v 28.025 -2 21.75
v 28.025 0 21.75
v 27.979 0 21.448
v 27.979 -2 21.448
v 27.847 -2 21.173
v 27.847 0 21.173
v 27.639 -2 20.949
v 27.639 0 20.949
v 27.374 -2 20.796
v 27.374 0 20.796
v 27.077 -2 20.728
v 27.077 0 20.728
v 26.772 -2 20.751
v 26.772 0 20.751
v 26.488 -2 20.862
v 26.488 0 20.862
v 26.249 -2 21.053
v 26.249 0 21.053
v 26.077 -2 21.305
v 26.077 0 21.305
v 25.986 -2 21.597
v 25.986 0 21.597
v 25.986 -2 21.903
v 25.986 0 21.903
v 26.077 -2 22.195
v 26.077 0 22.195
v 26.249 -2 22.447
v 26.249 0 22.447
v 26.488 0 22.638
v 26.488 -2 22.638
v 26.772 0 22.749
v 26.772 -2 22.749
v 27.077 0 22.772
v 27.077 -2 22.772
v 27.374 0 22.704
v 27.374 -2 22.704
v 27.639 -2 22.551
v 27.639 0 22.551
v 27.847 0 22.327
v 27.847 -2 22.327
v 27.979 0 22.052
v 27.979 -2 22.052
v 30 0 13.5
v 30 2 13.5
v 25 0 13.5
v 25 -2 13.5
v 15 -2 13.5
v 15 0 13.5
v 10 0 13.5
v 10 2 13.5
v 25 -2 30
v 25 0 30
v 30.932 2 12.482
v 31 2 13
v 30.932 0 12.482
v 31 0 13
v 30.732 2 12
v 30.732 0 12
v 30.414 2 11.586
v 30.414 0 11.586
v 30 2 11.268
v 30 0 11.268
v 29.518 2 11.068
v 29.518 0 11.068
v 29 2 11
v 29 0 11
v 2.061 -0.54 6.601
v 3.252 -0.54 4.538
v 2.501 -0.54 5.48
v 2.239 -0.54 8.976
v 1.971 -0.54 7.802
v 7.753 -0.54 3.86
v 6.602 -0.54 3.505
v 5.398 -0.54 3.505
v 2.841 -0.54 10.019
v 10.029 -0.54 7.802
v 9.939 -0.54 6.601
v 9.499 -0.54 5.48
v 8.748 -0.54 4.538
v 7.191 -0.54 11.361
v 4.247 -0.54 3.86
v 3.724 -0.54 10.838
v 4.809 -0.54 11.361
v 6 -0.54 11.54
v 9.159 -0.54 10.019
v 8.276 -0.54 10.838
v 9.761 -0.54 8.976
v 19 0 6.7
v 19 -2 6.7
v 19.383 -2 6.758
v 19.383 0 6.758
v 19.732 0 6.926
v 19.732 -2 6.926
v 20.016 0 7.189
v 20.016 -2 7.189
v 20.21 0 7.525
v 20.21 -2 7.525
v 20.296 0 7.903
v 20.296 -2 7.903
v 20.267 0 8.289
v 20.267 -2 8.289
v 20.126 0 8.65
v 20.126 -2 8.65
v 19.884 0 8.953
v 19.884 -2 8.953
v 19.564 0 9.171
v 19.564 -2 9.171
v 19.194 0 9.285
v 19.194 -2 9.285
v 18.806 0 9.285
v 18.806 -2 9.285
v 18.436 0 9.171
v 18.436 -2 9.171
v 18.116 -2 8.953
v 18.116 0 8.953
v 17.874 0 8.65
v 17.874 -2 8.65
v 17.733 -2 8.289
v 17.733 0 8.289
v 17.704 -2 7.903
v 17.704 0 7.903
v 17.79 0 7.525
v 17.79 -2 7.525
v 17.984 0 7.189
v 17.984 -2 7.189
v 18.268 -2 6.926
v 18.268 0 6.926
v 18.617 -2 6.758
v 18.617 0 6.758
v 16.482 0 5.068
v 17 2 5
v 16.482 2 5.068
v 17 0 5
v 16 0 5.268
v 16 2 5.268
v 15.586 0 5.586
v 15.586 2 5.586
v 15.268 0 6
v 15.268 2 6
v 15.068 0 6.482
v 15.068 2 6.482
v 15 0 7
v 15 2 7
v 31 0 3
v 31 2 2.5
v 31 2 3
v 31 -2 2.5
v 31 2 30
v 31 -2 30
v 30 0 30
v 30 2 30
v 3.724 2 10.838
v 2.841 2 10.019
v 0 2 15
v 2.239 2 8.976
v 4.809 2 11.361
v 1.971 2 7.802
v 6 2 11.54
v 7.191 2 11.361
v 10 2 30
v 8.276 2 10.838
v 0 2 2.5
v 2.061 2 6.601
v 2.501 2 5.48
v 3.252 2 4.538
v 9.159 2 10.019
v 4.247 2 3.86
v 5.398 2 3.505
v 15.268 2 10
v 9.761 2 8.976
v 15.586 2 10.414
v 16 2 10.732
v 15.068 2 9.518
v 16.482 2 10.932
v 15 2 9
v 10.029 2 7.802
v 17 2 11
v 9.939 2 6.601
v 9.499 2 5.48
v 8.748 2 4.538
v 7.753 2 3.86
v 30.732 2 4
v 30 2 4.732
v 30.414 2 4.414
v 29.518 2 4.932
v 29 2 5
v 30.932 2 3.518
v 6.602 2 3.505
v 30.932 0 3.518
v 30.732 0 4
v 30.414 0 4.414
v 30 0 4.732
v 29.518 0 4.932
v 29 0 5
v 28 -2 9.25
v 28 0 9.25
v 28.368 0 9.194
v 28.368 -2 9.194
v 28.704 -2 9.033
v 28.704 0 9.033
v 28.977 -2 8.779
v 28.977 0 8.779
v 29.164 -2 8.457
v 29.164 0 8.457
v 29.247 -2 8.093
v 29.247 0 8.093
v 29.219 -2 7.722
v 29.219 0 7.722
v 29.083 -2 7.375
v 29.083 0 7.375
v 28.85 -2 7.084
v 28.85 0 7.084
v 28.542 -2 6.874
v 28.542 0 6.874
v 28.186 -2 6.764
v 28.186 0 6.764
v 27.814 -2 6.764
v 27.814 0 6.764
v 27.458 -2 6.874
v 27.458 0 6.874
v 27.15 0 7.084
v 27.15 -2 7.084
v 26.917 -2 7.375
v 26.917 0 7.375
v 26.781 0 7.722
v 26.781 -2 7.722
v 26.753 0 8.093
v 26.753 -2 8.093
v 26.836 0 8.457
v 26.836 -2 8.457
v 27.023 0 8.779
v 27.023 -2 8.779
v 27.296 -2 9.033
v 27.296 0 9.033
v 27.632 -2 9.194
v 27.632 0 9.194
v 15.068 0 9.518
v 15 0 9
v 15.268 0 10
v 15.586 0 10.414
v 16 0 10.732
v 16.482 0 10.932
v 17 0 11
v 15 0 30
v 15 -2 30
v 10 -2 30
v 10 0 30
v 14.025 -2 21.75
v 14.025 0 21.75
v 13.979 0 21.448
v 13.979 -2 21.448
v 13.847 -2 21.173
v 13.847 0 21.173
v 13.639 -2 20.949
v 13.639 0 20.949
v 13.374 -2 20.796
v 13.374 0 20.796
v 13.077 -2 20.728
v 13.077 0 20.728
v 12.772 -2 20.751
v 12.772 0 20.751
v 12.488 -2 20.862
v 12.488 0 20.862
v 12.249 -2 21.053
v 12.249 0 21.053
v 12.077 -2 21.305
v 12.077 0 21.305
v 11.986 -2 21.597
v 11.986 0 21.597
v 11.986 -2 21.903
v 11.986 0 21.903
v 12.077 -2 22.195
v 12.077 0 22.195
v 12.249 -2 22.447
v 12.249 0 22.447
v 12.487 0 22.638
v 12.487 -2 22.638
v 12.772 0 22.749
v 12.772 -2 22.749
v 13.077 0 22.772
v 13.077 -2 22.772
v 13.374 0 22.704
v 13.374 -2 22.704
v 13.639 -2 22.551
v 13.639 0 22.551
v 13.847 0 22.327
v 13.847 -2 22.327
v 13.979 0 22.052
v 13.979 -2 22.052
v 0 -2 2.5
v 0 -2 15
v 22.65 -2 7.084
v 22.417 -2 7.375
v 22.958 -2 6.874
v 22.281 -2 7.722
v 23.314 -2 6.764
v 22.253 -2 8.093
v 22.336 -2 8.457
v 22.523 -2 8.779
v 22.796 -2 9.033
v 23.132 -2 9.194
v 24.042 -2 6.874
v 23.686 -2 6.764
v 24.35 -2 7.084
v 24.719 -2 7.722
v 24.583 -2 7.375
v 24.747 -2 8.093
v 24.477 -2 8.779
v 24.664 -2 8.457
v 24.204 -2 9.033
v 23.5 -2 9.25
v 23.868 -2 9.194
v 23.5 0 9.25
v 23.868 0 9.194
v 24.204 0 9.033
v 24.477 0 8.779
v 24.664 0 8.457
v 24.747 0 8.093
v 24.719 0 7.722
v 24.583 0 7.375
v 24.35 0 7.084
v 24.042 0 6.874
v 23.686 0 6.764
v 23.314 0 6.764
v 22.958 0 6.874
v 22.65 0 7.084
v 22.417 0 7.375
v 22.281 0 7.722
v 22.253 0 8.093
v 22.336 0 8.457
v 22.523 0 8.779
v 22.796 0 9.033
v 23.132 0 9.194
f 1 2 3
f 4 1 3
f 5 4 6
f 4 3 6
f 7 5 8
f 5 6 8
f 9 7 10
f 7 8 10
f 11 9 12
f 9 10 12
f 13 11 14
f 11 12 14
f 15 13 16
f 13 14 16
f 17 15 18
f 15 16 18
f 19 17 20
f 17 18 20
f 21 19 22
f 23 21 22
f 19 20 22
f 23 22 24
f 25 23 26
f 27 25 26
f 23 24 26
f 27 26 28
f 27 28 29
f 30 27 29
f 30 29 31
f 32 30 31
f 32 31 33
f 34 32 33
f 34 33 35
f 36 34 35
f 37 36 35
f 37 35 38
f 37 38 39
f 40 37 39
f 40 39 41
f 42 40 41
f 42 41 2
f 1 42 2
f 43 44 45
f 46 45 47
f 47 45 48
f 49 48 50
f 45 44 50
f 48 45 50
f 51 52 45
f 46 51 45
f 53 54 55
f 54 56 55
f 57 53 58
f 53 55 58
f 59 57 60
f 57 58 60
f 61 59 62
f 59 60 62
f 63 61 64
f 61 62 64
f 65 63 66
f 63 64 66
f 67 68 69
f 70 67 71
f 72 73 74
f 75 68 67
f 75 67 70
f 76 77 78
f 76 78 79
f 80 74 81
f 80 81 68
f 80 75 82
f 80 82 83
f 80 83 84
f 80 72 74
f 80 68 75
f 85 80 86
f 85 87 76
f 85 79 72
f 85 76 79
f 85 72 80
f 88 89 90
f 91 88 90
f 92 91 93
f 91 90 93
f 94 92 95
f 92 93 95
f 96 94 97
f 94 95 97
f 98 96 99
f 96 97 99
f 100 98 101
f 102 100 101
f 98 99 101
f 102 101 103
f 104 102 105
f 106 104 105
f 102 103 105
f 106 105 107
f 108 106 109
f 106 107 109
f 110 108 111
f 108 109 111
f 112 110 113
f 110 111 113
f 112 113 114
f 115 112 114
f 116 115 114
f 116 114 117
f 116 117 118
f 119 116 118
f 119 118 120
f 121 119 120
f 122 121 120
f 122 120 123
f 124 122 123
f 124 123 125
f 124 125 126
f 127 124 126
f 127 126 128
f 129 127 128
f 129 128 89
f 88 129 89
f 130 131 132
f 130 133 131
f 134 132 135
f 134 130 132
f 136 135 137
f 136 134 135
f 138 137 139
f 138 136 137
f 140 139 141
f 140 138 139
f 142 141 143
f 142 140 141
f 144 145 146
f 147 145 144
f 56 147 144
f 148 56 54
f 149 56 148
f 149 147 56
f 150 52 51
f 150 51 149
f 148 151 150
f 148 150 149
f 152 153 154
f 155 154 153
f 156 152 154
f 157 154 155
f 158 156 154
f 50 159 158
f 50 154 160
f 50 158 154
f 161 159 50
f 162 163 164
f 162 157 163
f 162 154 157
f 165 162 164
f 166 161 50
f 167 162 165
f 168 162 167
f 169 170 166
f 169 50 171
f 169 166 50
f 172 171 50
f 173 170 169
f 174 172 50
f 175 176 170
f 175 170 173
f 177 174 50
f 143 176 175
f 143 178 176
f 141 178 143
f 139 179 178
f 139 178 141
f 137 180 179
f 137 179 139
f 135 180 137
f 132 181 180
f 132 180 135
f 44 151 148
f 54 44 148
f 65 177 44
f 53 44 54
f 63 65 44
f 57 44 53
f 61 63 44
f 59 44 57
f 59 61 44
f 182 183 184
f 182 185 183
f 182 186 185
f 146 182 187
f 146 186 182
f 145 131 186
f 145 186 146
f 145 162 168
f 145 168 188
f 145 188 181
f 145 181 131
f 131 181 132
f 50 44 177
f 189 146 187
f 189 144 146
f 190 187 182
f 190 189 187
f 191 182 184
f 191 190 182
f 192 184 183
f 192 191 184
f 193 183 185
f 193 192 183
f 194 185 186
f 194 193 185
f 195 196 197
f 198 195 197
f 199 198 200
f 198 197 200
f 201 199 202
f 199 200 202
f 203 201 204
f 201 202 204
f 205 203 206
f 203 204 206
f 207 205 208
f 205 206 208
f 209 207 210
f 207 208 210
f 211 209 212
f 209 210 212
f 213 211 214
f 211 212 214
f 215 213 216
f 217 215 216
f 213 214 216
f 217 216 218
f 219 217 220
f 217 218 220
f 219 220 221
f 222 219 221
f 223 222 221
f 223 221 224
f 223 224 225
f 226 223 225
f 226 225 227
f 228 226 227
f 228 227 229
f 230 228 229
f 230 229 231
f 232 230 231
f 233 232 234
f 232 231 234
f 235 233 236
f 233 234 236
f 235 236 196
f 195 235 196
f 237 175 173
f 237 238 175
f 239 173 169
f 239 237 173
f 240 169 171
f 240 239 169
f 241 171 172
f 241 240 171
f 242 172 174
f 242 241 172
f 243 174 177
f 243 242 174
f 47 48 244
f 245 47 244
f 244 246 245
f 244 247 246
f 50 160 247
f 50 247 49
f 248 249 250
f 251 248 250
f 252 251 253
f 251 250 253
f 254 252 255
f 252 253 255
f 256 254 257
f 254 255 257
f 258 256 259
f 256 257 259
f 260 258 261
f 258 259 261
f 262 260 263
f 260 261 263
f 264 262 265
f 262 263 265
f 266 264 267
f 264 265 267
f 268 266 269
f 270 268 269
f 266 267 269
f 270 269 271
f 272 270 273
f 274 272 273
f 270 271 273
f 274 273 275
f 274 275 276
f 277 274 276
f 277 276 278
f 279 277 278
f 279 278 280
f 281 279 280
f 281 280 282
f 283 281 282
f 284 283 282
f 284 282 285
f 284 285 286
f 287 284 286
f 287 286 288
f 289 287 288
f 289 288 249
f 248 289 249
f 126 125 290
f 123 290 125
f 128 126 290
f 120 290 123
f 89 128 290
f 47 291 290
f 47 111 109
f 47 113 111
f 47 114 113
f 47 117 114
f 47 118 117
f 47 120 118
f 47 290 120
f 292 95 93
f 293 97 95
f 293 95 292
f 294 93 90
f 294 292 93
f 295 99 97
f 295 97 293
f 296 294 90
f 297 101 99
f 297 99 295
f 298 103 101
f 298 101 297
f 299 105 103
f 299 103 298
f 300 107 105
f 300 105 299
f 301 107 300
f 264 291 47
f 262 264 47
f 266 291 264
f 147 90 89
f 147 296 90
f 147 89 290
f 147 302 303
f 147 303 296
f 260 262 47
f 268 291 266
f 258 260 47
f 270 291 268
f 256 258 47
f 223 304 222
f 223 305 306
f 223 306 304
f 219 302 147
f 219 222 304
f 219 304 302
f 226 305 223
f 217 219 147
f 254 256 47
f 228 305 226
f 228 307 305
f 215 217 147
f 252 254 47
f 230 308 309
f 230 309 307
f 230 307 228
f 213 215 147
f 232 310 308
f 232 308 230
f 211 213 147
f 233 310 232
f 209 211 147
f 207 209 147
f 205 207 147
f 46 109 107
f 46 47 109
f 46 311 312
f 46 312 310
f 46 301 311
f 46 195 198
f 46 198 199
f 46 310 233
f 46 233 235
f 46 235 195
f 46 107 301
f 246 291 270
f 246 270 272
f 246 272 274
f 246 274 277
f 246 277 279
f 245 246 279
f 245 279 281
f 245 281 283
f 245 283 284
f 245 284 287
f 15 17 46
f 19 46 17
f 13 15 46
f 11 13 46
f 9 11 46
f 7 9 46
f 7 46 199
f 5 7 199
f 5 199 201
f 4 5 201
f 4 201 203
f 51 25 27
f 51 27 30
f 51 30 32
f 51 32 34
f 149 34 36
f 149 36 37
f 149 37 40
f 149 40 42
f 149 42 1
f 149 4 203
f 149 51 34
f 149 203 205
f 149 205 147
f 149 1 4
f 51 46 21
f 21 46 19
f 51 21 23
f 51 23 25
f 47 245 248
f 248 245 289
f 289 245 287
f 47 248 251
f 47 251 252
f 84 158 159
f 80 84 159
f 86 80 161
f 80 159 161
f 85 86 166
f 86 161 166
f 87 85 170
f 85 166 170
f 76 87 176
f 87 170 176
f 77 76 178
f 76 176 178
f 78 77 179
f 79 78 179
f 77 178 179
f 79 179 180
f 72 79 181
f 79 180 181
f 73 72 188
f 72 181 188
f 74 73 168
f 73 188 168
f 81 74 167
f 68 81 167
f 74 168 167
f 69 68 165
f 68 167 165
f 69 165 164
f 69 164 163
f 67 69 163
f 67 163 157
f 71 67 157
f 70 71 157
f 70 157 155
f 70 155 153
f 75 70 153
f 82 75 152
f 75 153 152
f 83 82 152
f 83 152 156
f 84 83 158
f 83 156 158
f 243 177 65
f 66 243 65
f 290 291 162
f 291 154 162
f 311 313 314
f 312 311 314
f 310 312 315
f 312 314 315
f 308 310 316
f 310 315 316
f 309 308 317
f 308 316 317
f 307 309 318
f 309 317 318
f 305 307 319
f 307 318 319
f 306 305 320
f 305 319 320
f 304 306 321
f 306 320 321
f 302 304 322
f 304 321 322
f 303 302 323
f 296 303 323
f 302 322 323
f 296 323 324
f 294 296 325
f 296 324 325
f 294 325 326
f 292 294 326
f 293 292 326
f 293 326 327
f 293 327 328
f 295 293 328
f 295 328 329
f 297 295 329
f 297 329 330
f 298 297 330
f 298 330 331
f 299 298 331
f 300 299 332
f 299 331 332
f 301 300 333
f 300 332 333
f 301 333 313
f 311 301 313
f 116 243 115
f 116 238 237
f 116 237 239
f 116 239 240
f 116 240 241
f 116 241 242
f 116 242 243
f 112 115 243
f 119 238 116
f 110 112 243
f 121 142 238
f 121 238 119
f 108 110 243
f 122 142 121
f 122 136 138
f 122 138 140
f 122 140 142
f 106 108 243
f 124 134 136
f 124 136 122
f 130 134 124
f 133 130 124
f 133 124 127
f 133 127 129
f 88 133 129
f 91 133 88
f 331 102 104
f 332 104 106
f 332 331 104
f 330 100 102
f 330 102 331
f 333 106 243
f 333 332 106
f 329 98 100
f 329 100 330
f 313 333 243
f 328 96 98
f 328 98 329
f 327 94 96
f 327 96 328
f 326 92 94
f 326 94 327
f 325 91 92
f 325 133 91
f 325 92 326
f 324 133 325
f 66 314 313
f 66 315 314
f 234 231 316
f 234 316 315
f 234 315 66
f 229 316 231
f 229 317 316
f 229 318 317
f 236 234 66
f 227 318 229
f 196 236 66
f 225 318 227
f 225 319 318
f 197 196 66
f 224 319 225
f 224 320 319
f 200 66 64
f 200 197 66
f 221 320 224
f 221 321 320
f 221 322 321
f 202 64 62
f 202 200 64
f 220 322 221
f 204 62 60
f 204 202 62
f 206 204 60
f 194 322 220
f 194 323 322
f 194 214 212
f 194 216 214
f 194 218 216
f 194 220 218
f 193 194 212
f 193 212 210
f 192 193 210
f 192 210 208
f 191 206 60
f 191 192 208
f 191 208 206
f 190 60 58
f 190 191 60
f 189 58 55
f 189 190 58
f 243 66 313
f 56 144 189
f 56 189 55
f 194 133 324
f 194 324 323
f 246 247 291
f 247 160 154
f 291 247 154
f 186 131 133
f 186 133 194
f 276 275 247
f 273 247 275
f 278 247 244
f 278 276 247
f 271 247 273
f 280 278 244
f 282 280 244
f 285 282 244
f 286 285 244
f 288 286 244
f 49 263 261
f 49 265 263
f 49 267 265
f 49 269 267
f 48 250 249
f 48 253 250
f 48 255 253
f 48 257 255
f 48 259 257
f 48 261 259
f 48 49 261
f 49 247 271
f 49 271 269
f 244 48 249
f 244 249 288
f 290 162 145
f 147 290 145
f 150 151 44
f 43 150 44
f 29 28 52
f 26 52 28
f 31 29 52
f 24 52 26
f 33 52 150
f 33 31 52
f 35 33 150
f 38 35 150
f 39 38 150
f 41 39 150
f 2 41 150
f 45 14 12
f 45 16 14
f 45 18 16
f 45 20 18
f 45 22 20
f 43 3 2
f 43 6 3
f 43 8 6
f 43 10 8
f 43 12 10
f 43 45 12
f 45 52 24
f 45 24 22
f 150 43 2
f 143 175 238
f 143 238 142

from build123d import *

# Parameters (mm, degrees)
EXTRUDE_1_DEPTH          = 2
EXTRUDE_2_DEPTH          = 3
SKETCH_3_W               = 16
SKETCH_3_H               = 60
EXTRUDE_3_DEPTH          = 3
CUT_EXTRUDE_1_DEPTH      = 1
CUT_EXTRUDE_2_DEPTH      = 69.543781629
SKETCH_6_W               = 20
SKETCH_6_H               = 16.5
CUT_EXTRUDE_4_DEPTH      = 2
CUT_EXTRUDE_6_DEPTH      = 69.543781629
CUT_EXTRUDE_6_DEPTH_BACK = 69.543781629
EXTRUDE_START            = -1
EXTRUDE_4_DEPTH          = 1
SKETCH_12_R              = 1
SKETCH_12_R_2            = 4
CUT_EXTRUDE_7_DEPTH      = 2.54
SKETCH_13_R              = 1.25
CUT_EXTRUDE_8_DEPTH      = 10
SKETCH_15_R              = 1
CUT_EXTRUDE_10_DEPTH     = 10
SKETCH_16_R              = 1.02
CUT_EXTRUDE_11_DEPTH     = 2
SKETCH_19_R              = 1.808389453
SKETCH_19_R_2            = 1.798107518
SKETCH_19_R_3            = 1.231148897
SKETCH_19_R_4            = 1.358627773
EXTRUDE_5_DEPTH          = 2
EXTRUDE_START_2          = -3
SKETCH_19_3_R            = 1.231148897
SKETCH_19_3_R_2          = 1.358627773
EXTRUDE_6_DEPTH          = 1
HOLE_WIZARD_M2_5_1_D     = 2.05
HOLE_WIZARD_M2_1_D       = 1.6
SKETCH_25_R              = 4.02
CUT_EXTRUDE_12_DEPTH     = 2.54
SKETCH_30_W              = 55.306598362
SKETCH_30_H              = 0.5
CUT_EXTRUDE_17_DEPTH     = 75.310646225
SKETCH_31_W              = 47.74998635
SKETCH_31_H              = 36.890870636
CUT_EXTRUDE_18_DEPTH     = 75.22986018
SKETCH_32_W              = 16
SKETCH_32_H              = 6
CUT_EXTRUDE_19_DEPTH     = 2
FILLET_2_R               = 2
SKETCH_33_R              = 1.25
CUT_EXTRUDE_20_DEPTH     = 2
SKETCH_35_R              = 4.02
EXTRUDE_7_DEPTH          = 4
SKETCH_36_R              = 4.04
CUT_EXTRUDE_21_DEPTH     = 2.54
SKETCH_37_W              = 31
SKETCH_37_H              = 0.5
CUT_EXTRUDE_22_DEPTH     = 10
SKETCH_38_R              = 1.3
CUT_EXTRUDE_23_DEPTH     = 44.324358045


with BuildPart() as part:
    # 草图1 → 凸台-拉伸1 (new body)
    with BuildSketch(Plane(origin=(0, 0, 0), x_dir=(1, 0, 0), z_dir=(0, 1, 0))):
        with BuildLine():
            Line((43, 1.5), (58.456841673, 3.534931811))
            ThreePointArc((58.456841673, 3.534931811), (61.401458892, 6.180320766), (59.995303837, 9.880534443))
            Line((59.995303837, 9.880534443), (31, 30))
            Line((31, 30), (10, 30))
            Line((10, 30), (0, 15))
            Line((0, 15), (0, -15))
            Line((0, -15), (10, -30))
            Line((10, -30), (31, -30))
            Line((31, -30), (59.995303837, -9.880534443))
            ThreePointArc((59.995303837, -9.880534443), (61.401458892, -6.180320766), (58.456841673, -3.534931811))
            Line((58.456841673, -3.534931811), (43, -1.5))
            Line((43, -1.5), (40, -1.5))
            Line((40, -1.5), (40, 1.5))
            Line((40, 1.5), (43, 1.5))
        make_face()
    extrude(amount=EXTRUDE_1_DEPTH)

    # 草图2 → 凸台-拉伸2 (add)
    with BuildSketch(Plane.XZ):
        Polygon((15, -30), (15, 30), (10, 30), (0, 15), (0, -15), (10, -30), align=None)
    extrude(amount=EXTRUDE_2_DEPTH)

    # 草图3 → 凸台-拉伸3 (add)
    with BuildSketch(Plane.XZ):
        with Locations((23, 0)):
            Rectangle(SKETCH_3_W, SKETCH_3_H)
    extrude(amount=EXTRUDE_3_DEPTH)

    # 草图5 → 切除-拉伸1 (cut)
    with BuildSketch(Plane.XZ.offset(3)):
        Polygon((10, -30), (31, -30), (31, 30), (10, 30), (0, 15), (0, -15), align=None)
    extrude(amount=-CUT_EXTRUDE_1_DEPTH, mode=Mode.SUBTRACT)

    # 草图4 → 切除-拉伸2 (cut, through all)
    with BuildSketch(Plane(origin=(0, 2, 0), x_dir=(1, 0, 0), z_dir=(0, 1, 0))):
        Polygon((15, -30.054194631), (25, -30), (25, -13.5), (15, -13.5), align=None)
        Polygon((25, 13.5), (15, 13.5), (15, 30.054194631), (25, 30), align=None)
    extrude(amount=-CUT_EXTRUDE_2_DEPTH, mode=Mode.SUBTRACT)

    # 草图6 → 切除-拉伸4 (cut)
    with BuildSketch(Plane(origin=(0, 2, 0), x_dir=(1, 0, 0), z_dir=(0, 1, 0))):
        with Locations((20, 21.75)):
            Rectangle(SKETCH_6_W, SKETCH_6_H)
        with Locations((20, -21.75)):
            Rectangle(SKETCH_6_W, SKETCH_6_H)
    extrude(amount=-CUT_EXTRUDE_4_DEPTH, mode=Mode.SUBTRACT)

    # 草图10 → 切除-拉伸6 (cut, two sides: drawn at the far end of the back side and taken through both)
    with BuildSketch(Plane(origin=(0, 2, 0), x_dir=(1, 0, 0), z_dir=(0, 1, 0)).offset(-CUT_EXTRUDE_6_DEPTH_BACK)):
        Polygon((40, -1.5), (-11.100796723, -1.5), (-3.854090755, 32.230988753), (54.203821011, 29.618804043), (85.46449539, 13.041941672), (77.376427304, 2.654316721), align=None)
    extrude(amount=CUT_EXTRUDE_6_DEPTH + CUT_EXTRUDE_6_DEPTH_BACK, mode=Mode.SUBTRACT)

    # 草图11 → 凸台-拉伸4 (add)
    with BuildSketch(Plane(origin=(0, 2, 0), x_dir=(1, 0, 0), z_dir=(0, 1, 0)).offset(EXTRUDE_START)):
        with BuildLine():
            Line((31, -34.868641247), (62.27565108, -13.166872292))
            ThreePointArc((62.27565108, -13.166872292), (65.15434027, -9.255636577), (65.033342884, -4.400744621))
            Line((65.033342884, -4.400744621), (58.456841673, -3.534931811))
            ThreePointArc((58.456841673, -3.534931811), (61.401458892, -6.180320766), (59.995303837, -9.880534443))
            Line((59.995303837, -9.880534443), (31, -30))
            Line((31, -30), (31, -34))
            Line((31, -34), (31, -34.868641247))
        make_face()
    extrude(amount=EXTRUDE_4_DEPTH)

    # 草图12 → 切除-拉伸7 (cut)
    with BuildSketch(Plane(origin=(0, 2, 0), x_dir=(1, 0, 0), z_dir=(0, 1, 0))):
        with Locations(Location((58, -7.004988826, 0), (0, 0, 270))):
            Circle(SKETCH_12_R)
        with Locations(Location((43, -6, 0), (0, 0, 270))):
            Circle(SKETCH_12_R)
        with Locations(Location((6, -7.25, 0), (0, 0, 270))):
            Circle(SKETCH_12_R_2)
    extrude(amount=-CUT_EXTRUDE_7_DEPTH, mode=Mode.SUBTRACT)

    # 草图13 → 切除-拉伸8 (cut)
    with BuildSketch(Plane(origin=(0, 0, 0), x_dir=(1, 0, 0), z_dir=(0, 1, 0))):
        with Locations(Location((13, -21.75, 0), (0, 0, 270))):
            Circle(SKETCH_13_R)
        with Locations(Location((27, -21.75, 0), (0, 0, 270))):
            Circle(SKETCH_13_R)
    extrude(amount=-CUT_EXTRUDE_8_DEPTH, mode=Mode.SUBTRACT)

    # 草图15 → 切除-拉伸10 (cut)
    with BuildSketch(Plane.XZ.offset(-1)):
        with Locations(Location((36, 29.573465579, 0), (0, 0, 270))):
            Circle(SKETCH_15_R)
        with Locations(Location((56, 15.695724776, 0), (0, 0, 270))):
            Circle(SKETCH_15_R)
    extrude(amount=-CUT_EXTRUDE_10_DEPTH, mode=Mode.SUBTRACT)

    # 草图16 → 切除-拉伸11 (cut)
    with BuildSketch(Plane.XZ):
        with Locations(Location((58, 7.004988826, 0), (0, 0, 270))):
            Circle(SKETCH_16_R)
        with Locations(Location((43, 6, 0), (0, 0, 270))):
            Circle(SKETCH_16_R)
    extrude(amount=-CUT_EXTRUDE_11_DEPTH, mode=Mode.SUBTRACT)

    # 草图19 → 凸台-拉伸5 (add)
    with BuildSketch(Plane.XZ.offset(2)):
        with Locations((13, 21.75)):
            Circle(SKETCH_19_R)
        with Locations((27, 21.75)):
            Circle(SKETCH_19_R_2)
        with Locations((36, 29.573465579)):
            Circle(SKETCH_19_R_3)
        with Locations((56, 15.695724776)):
            Circle(SKETCH_19_R_4)
    extrude(amount=-EXTRUDE_5_DEPTH)


with BuildPart() as extrude_5_kept_piece:
    # of the separate pieces the step leaves, the one the design keeps (extrude_5_pieces_kept)
    add(part.part.solids().sort_by_distance((58.456841673, 0, 3.534931811))[0])

    # 草图19<3> → 凸台-拉伸6 (add)
    with BuildSketch(Plane.XZ.offset(2).offset(EXTRUDE_START_2)):
        with Locations((36, 29.573465579)):
            Circle(SKETCH_19_3_R)
        with Locations((56, 15.695724776)):
            Circle(SKETCH_19_3_R_2)
    extrude(amount=-EXTRUDE_6_DEPTH)

    # M2.5 螺纹孔1 (through all)
    with Locations(Plane(origin=(0, -2, 0), x_dir=(-1, 0, 0), z_dir=(0, -1, 0))):
        with Locations((-27, -21.75), (-13, -21.75)):
            Hole(HOLE_WIZARD_M2_5_1_D / 2)

    # M2 螺纹孔1 (through all)
    with Locations(Plane(origin=(0, 1, 0), x_dir=(-1, 0, 0), z_dir=(0, -1, 0))):
        with Locations((-56, -15.695724776), (-36, -29.573465579)):
            Hole(HOLE_WIZARD_M2_1_D / 2)

    # 草图25 → 切除-拉伸12 (cut)
    with BuildSketch(Plane(origin=(0, 2, 0), x_dir=(1, 0, 0), z_dir=(0, 1, 0))):
        with Locations(Location((6, -7.25, 0), (0, 0, 270))):
            Circle(SKETCH_25_R)
    extrude(amount=-CUT_EXTRUDE_12_DEPTH, mode=Mode.SUBTRACT)

    # 草图30 → 切除-拉伸17 (cut, through all)
    with BuildSketch(Plane.XZ.offset(2)):
        with Locations((27.653299181, 1.75)):
            Rectangle(SKETCH_30_W, SKETCH_30_H)
    extrude(amount=-CUT_EXTRUDE_17_DEPTH, mode=Mode.SUBTRACT)

    # 草图31 → 切除-拉伸18 (cut, through all)
    with BuildSketch(Plane.XZ):
        with Locations((54.874993175, 20.445435318)):
            Rectangle(SKETCH_31_W, SKETCH_31_H)
    extrude(amount=-CUT_EXTRUDE_18_DEPTH, mode=Mode.SUBTRACT)

    # 草图32 → 切除-拉伸19 (cut)
    with BuildSketch(Plane(origin=(0, 2, 0), x_dir=(1, 0, 0), z_dir=(0, 1, 0))):
        with Locations((23, -8)):
            Rectangle(SKETCH_32_W, SKETCH_32_H)
    extrude(amount=-CUT_EXTRUDE_19_DEPTH, mode=Mode.SUBTRACT)

    # 圆角2
    fillet_2_edges = [extrude_5_kept_piece.edges().sort_by_distance(p)[0] for p in [
        (31, 1, 5),
        (31, 1, 11),
        (15, 1, 11),
        (15, 1, 5),
    ]]
    fillet(fillet_2_edges, radius=FILLET_2_R)

    # 草图33 → 切除-拉伸20 (cut)
    with BuildSketch(Plane(origin=(0, 0, 0), x_dir=(1, 0, 0), z_dir=(0, 1, 0))):
        with Locations(Location((19, -8, 0), (0, 0, 270))):
            Circle(SKETCH_33_R)
        with Locations(Location((23.5, -8, 0), (0, 0, 270))):
            Circle(SKETCH_33_R)
        with Locations(Location((28, -8, 0), (0, 0, 270))):
            Circle(SKETCH_33_R)
    extrude(amount=-CUT_EXTRUDE_20_DEPTH, mode=Mode.SUBTRACT)

    # 草图35 → 凸台-拉伸7 (add)
    with BuildSketch(Plane(origin=(0, 2, 0), x_dir=(1, 0, 0), z_dir=(0, 1, 0))):
        with Locations((6, -7.25)):
            Circle(SKETCH_35_R)
    extrude(amount=-EXTRUDE_7_DEPTH)

    # 草图36 → 切除-拉伸21 (cut)
    with BuildSketch(Plane(origin=(0, 2, 0), x_dir=(1, 0, 0), z_dir=(0, 1, 0))):
        with Locations(Location((6, -7.5, 0), (0, 0, 270))):
            Circle(SKETCH_36_R)
    extrude(amount=-CUT_EXTRUDE_21_DEPTH, mode=Mode.SUBTRACT)

    # 草图37 → 切除-拉伸22 (cut)
    with BuildSketch(Plane(origin=(0, 2, 0), x_dir=(1, 0, 0), z_dir=(0, 1, 0))):
        with Locations((15.5, -2.25)):
            Rectangle(SKETCH_37_W, SKETCH_37_H)
    extrude(amount=-CUT_EXTRUDE_22_DEPTH, mode=Mode.SUBTRACT)

    # 草图38 → 切除-拉伸23 (cut, through all)
    with BuildSketch(Plane.XZ.offset(2)):
        with Locations(Location((19, 8, 0), (0, 0, 270))):
            Circle(SKETCH_38_R)
    extrude(amount=-CUT_EXTRUDE_23_DEPTH, mode=Mode.SUBTRACT)


solid = extrude_5_kept_piece.part
